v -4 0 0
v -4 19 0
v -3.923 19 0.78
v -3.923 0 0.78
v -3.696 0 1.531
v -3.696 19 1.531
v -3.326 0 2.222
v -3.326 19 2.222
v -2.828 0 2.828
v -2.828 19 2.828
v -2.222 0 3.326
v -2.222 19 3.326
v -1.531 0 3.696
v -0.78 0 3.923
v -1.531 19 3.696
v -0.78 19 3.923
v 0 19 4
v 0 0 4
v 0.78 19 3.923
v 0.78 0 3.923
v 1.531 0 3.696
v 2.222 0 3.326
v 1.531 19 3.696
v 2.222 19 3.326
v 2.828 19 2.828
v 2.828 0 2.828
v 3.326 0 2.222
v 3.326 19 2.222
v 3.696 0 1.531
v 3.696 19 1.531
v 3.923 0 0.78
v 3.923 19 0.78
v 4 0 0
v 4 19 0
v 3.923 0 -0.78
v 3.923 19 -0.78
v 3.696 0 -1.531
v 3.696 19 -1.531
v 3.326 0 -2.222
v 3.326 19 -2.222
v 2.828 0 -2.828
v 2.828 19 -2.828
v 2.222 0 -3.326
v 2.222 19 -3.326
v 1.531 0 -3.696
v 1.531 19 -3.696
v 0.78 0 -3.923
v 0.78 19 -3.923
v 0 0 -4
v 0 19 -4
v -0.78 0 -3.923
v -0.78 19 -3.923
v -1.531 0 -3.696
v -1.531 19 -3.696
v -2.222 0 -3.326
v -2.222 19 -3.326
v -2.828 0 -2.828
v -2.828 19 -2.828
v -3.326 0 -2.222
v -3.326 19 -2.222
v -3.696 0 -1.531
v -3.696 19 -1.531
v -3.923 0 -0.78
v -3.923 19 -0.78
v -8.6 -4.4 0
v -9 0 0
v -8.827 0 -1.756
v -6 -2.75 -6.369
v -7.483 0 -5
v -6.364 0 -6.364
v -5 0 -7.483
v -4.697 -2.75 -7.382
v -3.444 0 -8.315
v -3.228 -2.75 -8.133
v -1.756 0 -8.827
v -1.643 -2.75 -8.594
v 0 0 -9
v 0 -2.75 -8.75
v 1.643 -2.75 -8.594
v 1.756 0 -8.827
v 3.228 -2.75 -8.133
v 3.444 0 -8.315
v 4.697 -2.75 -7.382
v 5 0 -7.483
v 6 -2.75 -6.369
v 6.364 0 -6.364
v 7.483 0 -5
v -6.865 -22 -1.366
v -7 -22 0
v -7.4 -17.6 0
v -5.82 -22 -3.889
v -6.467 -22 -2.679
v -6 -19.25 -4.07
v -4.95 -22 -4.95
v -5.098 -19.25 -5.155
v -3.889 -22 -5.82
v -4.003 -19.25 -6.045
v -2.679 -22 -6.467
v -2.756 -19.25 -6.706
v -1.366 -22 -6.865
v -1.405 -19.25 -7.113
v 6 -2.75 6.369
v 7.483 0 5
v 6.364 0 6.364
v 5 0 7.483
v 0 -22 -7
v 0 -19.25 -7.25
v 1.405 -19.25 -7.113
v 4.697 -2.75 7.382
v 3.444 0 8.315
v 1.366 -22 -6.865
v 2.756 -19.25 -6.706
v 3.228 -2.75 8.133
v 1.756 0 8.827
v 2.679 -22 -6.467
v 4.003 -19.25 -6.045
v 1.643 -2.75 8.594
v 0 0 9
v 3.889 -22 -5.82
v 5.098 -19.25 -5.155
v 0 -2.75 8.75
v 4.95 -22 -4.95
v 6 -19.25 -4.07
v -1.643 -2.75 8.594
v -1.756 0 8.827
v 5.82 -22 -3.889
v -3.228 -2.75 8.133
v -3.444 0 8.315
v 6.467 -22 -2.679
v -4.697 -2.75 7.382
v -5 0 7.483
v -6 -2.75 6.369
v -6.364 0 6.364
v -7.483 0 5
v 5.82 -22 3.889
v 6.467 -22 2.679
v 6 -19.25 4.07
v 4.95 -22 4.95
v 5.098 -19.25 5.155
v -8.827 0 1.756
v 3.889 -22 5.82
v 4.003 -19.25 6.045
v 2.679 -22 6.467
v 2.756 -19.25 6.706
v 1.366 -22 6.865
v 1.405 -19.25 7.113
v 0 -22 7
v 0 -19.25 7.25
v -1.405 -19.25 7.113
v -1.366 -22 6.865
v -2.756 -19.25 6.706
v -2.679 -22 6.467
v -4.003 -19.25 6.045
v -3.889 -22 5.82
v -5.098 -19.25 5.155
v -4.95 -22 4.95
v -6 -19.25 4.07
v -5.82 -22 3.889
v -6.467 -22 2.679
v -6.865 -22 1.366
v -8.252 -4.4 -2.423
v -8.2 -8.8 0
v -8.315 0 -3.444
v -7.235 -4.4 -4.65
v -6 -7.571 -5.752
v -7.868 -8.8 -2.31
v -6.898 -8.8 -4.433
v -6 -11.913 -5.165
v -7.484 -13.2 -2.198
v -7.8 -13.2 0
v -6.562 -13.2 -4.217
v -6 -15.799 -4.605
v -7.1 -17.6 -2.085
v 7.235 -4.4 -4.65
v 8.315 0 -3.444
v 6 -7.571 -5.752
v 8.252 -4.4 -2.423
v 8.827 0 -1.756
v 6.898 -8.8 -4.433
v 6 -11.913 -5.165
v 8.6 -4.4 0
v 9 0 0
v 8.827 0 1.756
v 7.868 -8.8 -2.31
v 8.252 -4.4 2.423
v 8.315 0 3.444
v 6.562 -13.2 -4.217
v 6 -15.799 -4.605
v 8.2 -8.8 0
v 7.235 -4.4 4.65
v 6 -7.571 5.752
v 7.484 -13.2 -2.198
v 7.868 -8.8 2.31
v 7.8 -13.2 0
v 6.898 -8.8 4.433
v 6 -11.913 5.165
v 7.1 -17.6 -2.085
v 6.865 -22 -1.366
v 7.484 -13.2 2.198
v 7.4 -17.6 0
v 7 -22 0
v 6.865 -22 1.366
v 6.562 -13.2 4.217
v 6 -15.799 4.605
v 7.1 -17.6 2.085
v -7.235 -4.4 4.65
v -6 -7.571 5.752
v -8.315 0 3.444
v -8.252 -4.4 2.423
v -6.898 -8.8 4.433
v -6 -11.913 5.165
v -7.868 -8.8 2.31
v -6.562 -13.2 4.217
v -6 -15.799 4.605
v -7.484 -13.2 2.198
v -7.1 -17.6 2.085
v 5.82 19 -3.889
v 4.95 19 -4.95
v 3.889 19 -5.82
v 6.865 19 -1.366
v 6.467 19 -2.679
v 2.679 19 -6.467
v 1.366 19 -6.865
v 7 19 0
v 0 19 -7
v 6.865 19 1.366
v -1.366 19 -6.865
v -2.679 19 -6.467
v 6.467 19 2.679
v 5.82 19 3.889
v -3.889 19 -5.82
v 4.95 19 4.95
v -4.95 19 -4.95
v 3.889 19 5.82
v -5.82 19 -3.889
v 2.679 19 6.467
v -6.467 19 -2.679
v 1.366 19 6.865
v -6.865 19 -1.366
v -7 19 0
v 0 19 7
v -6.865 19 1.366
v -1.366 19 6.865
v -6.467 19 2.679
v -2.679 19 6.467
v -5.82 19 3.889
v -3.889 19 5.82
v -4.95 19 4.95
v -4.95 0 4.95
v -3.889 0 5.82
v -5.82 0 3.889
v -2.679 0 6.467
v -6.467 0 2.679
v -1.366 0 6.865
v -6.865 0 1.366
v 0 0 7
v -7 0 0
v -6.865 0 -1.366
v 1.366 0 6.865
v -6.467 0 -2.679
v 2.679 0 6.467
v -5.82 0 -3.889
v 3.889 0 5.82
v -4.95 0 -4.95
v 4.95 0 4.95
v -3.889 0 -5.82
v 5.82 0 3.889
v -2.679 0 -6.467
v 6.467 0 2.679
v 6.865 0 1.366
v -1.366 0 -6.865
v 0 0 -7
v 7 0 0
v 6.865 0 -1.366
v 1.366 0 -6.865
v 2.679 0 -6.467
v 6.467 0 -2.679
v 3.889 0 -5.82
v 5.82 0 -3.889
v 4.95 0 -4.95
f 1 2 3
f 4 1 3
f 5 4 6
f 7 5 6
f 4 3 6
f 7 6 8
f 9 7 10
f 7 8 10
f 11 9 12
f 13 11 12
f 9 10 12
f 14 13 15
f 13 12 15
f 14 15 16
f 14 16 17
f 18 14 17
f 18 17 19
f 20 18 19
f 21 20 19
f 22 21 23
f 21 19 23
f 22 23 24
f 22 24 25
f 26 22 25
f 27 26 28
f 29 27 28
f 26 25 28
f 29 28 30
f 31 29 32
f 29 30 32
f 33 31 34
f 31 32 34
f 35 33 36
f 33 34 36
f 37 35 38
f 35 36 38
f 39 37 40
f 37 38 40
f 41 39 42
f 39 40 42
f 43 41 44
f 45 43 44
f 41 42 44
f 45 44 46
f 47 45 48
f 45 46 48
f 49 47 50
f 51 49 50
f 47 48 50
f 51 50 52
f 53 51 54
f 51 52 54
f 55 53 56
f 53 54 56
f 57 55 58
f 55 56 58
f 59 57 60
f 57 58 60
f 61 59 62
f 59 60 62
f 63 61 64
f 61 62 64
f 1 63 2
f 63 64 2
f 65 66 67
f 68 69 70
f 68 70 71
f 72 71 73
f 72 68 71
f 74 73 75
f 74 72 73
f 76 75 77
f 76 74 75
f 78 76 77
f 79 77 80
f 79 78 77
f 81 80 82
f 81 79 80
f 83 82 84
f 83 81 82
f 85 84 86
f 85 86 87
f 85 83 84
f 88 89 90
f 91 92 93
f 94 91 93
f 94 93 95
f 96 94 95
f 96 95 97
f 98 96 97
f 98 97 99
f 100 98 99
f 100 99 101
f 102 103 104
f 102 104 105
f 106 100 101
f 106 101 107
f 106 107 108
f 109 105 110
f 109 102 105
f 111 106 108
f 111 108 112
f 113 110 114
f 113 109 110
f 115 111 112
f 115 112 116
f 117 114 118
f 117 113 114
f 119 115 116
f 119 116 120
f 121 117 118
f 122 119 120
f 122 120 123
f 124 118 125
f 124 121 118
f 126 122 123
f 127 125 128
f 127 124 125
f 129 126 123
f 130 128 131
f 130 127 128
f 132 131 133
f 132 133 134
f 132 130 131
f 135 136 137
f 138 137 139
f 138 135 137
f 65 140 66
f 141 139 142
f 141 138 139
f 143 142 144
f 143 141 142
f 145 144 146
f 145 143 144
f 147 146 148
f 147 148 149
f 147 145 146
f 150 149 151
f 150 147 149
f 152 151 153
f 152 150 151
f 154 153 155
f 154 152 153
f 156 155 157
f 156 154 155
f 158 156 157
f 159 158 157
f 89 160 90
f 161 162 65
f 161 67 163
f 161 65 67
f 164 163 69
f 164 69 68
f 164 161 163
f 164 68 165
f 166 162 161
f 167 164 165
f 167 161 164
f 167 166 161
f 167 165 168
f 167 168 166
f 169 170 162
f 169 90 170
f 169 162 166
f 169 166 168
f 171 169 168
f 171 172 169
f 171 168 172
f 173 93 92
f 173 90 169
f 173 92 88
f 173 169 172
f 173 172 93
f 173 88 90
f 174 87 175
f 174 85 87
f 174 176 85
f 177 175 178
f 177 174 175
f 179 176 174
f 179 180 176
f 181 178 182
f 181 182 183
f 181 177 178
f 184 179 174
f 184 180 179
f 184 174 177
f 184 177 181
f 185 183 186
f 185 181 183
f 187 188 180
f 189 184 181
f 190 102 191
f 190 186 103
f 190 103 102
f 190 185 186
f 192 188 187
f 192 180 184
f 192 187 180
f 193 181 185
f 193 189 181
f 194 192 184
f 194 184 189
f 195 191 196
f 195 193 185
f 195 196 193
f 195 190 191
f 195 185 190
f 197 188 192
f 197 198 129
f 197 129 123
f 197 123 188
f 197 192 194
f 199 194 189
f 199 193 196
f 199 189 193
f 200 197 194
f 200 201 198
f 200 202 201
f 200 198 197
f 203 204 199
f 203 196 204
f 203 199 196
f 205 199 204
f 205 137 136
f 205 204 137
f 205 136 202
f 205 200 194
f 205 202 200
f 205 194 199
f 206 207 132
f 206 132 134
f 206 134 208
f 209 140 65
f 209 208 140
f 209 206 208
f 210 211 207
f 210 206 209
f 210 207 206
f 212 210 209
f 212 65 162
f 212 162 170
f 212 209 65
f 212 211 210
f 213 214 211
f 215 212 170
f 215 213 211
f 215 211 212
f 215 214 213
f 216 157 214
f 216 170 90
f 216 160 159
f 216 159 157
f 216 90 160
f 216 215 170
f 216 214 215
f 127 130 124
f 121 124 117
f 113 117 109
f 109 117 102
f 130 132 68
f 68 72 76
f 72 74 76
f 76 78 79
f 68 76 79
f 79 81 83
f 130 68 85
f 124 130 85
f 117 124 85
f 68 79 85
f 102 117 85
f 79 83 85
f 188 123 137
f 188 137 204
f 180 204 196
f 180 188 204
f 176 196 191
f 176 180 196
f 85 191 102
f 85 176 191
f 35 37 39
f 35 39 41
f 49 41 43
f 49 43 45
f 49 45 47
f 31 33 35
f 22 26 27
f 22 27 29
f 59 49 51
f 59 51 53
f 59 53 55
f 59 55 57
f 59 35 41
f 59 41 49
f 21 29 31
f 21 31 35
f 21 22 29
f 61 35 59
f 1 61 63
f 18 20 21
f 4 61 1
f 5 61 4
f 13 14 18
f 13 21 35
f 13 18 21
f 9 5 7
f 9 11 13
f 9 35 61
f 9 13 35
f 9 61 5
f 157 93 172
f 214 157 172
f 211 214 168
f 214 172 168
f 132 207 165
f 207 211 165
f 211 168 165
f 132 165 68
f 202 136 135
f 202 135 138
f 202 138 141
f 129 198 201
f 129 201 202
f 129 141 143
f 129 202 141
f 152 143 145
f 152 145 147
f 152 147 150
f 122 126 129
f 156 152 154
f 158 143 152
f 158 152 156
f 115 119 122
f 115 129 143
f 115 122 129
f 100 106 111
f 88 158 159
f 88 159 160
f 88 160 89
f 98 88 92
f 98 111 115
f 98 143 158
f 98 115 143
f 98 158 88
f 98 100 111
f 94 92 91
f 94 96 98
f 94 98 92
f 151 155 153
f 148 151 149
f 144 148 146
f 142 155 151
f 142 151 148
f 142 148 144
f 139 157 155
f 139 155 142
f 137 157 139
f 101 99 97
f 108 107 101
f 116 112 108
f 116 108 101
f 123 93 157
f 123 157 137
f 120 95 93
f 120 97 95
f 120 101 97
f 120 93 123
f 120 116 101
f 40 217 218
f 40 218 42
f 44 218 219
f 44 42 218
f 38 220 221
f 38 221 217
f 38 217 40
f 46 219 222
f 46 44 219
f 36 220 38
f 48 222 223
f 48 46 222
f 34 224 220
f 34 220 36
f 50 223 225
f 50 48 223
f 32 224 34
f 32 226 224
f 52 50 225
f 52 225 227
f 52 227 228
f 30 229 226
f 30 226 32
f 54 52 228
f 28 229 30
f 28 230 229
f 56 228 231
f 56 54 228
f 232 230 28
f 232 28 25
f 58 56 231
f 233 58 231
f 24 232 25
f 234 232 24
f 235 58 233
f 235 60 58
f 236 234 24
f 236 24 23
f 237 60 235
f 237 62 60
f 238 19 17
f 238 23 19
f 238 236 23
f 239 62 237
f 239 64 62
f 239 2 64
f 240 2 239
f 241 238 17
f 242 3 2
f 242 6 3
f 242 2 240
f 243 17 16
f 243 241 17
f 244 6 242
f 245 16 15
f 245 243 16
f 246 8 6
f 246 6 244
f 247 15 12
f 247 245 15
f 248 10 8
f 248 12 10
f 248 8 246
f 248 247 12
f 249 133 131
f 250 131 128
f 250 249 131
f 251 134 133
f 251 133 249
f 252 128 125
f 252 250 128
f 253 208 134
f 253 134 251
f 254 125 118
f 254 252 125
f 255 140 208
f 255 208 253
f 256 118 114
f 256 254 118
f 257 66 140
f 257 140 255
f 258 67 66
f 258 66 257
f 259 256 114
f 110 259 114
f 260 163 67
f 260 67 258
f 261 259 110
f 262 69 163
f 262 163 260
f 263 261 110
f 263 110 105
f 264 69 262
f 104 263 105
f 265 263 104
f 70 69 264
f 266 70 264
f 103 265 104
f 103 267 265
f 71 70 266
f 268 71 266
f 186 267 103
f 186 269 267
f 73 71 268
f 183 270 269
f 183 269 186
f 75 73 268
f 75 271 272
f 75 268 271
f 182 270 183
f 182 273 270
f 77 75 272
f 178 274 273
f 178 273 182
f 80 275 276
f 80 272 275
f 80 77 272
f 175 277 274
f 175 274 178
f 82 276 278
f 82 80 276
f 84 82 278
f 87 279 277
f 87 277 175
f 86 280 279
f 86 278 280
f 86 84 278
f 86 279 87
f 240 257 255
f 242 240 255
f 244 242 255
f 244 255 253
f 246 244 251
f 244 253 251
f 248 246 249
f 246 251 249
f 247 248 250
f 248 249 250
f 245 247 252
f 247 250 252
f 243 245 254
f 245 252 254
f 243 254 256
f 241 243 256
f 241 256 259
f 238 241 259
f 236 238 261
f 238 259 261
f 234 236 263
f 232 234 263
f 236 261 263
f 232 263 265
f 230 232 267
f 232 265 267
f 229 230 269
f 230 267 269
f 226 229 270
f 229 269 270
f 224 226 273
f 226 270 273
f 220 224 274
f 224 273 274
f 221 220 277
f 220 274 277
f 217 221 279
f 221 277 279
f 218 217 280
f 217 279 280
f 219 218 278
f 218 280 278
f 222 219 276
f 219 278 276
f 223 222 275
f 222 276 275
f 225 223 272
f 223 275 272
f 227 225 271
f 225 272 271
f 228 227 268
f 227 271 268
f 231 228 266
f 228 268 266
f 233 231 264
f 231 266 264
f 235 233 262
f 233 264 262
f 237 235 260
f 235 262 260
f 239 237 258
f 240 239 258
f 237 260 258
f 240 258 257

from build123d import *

# Parameters (mm, degrees)
SKETCH3_R               = 7
BOSS_EXTRUDE1_DEPTH     = 19
SKETCH4_R               = 4
CUT_EXTRUDE1_DEPTH      = 19
CUT_EXTRUDE2_DEPTH      = 26.416530054
CUT_EXTRUDE2_DEPTH_BACK = 26.416530054
SKETCH5_W               = 12
SKETCH5_H               = 16.5


with BuildPart() as part:
    # Sketch2 → Revolve2 (revolve)
    with BuildSketch(Plane.XY, mode=Mode.PRIVATE) as revolve2_sk:
        Polygon((0, 0), (9, 0), (7, -22), (0, -22), align=None)
    revolve(revolve2_sk.sketch.rotate(Axis((0, 0, 0), (0, -1, 0)), 180), axis=Axis((0, 0, 0), (0, -1, 0)))

    # Sketch3 → Boss-Extrude1 (add)
    with BuildSketch(Plane(origin=(0, 0, 0), x_dir=(1, 0, 0), z_dir=(0, 1, 0))):
        with Locations(Location((0, 0, 0), (0, 0, 180))):
            Circle(SKETCH3_R)
    extrude(amount=BOSS_EXTRUDE1_DEPTH)

    # Sketch4 → Cut-Extrude1 (cut)
    with BuildSketch(Plane(origin=(0, 19, 0), x_dir=(1, 0, 0), z_dir=(0, 1, 0))):
        with Locations(Location((0, 0, 0), (0, 0, 180))):
            Circle(SKETCH4_R)
    extrude(amount=-CUT_EXTRUDE1_DEPTH, mode=Mode.SUBTRACT)

    # Sketch5 → Cut-Extrude2 (cut, two sides: drawn at the far end of the back side and taken through both)
    with BuildSketch(Plane.XY.offset(-CUT_EXTRUDE2_DEPTH_BACK)):
        with Locations((0, -11)):
            Rectangle(SKETCH5_W, SKETCH5_H)
    extrude(amount=CUT_EXTRUDE2_DEPTH + CUT_EXTRUDE2_DEPTH_BACK, mode=Mode.SUBTRACT)


solid = part.part
